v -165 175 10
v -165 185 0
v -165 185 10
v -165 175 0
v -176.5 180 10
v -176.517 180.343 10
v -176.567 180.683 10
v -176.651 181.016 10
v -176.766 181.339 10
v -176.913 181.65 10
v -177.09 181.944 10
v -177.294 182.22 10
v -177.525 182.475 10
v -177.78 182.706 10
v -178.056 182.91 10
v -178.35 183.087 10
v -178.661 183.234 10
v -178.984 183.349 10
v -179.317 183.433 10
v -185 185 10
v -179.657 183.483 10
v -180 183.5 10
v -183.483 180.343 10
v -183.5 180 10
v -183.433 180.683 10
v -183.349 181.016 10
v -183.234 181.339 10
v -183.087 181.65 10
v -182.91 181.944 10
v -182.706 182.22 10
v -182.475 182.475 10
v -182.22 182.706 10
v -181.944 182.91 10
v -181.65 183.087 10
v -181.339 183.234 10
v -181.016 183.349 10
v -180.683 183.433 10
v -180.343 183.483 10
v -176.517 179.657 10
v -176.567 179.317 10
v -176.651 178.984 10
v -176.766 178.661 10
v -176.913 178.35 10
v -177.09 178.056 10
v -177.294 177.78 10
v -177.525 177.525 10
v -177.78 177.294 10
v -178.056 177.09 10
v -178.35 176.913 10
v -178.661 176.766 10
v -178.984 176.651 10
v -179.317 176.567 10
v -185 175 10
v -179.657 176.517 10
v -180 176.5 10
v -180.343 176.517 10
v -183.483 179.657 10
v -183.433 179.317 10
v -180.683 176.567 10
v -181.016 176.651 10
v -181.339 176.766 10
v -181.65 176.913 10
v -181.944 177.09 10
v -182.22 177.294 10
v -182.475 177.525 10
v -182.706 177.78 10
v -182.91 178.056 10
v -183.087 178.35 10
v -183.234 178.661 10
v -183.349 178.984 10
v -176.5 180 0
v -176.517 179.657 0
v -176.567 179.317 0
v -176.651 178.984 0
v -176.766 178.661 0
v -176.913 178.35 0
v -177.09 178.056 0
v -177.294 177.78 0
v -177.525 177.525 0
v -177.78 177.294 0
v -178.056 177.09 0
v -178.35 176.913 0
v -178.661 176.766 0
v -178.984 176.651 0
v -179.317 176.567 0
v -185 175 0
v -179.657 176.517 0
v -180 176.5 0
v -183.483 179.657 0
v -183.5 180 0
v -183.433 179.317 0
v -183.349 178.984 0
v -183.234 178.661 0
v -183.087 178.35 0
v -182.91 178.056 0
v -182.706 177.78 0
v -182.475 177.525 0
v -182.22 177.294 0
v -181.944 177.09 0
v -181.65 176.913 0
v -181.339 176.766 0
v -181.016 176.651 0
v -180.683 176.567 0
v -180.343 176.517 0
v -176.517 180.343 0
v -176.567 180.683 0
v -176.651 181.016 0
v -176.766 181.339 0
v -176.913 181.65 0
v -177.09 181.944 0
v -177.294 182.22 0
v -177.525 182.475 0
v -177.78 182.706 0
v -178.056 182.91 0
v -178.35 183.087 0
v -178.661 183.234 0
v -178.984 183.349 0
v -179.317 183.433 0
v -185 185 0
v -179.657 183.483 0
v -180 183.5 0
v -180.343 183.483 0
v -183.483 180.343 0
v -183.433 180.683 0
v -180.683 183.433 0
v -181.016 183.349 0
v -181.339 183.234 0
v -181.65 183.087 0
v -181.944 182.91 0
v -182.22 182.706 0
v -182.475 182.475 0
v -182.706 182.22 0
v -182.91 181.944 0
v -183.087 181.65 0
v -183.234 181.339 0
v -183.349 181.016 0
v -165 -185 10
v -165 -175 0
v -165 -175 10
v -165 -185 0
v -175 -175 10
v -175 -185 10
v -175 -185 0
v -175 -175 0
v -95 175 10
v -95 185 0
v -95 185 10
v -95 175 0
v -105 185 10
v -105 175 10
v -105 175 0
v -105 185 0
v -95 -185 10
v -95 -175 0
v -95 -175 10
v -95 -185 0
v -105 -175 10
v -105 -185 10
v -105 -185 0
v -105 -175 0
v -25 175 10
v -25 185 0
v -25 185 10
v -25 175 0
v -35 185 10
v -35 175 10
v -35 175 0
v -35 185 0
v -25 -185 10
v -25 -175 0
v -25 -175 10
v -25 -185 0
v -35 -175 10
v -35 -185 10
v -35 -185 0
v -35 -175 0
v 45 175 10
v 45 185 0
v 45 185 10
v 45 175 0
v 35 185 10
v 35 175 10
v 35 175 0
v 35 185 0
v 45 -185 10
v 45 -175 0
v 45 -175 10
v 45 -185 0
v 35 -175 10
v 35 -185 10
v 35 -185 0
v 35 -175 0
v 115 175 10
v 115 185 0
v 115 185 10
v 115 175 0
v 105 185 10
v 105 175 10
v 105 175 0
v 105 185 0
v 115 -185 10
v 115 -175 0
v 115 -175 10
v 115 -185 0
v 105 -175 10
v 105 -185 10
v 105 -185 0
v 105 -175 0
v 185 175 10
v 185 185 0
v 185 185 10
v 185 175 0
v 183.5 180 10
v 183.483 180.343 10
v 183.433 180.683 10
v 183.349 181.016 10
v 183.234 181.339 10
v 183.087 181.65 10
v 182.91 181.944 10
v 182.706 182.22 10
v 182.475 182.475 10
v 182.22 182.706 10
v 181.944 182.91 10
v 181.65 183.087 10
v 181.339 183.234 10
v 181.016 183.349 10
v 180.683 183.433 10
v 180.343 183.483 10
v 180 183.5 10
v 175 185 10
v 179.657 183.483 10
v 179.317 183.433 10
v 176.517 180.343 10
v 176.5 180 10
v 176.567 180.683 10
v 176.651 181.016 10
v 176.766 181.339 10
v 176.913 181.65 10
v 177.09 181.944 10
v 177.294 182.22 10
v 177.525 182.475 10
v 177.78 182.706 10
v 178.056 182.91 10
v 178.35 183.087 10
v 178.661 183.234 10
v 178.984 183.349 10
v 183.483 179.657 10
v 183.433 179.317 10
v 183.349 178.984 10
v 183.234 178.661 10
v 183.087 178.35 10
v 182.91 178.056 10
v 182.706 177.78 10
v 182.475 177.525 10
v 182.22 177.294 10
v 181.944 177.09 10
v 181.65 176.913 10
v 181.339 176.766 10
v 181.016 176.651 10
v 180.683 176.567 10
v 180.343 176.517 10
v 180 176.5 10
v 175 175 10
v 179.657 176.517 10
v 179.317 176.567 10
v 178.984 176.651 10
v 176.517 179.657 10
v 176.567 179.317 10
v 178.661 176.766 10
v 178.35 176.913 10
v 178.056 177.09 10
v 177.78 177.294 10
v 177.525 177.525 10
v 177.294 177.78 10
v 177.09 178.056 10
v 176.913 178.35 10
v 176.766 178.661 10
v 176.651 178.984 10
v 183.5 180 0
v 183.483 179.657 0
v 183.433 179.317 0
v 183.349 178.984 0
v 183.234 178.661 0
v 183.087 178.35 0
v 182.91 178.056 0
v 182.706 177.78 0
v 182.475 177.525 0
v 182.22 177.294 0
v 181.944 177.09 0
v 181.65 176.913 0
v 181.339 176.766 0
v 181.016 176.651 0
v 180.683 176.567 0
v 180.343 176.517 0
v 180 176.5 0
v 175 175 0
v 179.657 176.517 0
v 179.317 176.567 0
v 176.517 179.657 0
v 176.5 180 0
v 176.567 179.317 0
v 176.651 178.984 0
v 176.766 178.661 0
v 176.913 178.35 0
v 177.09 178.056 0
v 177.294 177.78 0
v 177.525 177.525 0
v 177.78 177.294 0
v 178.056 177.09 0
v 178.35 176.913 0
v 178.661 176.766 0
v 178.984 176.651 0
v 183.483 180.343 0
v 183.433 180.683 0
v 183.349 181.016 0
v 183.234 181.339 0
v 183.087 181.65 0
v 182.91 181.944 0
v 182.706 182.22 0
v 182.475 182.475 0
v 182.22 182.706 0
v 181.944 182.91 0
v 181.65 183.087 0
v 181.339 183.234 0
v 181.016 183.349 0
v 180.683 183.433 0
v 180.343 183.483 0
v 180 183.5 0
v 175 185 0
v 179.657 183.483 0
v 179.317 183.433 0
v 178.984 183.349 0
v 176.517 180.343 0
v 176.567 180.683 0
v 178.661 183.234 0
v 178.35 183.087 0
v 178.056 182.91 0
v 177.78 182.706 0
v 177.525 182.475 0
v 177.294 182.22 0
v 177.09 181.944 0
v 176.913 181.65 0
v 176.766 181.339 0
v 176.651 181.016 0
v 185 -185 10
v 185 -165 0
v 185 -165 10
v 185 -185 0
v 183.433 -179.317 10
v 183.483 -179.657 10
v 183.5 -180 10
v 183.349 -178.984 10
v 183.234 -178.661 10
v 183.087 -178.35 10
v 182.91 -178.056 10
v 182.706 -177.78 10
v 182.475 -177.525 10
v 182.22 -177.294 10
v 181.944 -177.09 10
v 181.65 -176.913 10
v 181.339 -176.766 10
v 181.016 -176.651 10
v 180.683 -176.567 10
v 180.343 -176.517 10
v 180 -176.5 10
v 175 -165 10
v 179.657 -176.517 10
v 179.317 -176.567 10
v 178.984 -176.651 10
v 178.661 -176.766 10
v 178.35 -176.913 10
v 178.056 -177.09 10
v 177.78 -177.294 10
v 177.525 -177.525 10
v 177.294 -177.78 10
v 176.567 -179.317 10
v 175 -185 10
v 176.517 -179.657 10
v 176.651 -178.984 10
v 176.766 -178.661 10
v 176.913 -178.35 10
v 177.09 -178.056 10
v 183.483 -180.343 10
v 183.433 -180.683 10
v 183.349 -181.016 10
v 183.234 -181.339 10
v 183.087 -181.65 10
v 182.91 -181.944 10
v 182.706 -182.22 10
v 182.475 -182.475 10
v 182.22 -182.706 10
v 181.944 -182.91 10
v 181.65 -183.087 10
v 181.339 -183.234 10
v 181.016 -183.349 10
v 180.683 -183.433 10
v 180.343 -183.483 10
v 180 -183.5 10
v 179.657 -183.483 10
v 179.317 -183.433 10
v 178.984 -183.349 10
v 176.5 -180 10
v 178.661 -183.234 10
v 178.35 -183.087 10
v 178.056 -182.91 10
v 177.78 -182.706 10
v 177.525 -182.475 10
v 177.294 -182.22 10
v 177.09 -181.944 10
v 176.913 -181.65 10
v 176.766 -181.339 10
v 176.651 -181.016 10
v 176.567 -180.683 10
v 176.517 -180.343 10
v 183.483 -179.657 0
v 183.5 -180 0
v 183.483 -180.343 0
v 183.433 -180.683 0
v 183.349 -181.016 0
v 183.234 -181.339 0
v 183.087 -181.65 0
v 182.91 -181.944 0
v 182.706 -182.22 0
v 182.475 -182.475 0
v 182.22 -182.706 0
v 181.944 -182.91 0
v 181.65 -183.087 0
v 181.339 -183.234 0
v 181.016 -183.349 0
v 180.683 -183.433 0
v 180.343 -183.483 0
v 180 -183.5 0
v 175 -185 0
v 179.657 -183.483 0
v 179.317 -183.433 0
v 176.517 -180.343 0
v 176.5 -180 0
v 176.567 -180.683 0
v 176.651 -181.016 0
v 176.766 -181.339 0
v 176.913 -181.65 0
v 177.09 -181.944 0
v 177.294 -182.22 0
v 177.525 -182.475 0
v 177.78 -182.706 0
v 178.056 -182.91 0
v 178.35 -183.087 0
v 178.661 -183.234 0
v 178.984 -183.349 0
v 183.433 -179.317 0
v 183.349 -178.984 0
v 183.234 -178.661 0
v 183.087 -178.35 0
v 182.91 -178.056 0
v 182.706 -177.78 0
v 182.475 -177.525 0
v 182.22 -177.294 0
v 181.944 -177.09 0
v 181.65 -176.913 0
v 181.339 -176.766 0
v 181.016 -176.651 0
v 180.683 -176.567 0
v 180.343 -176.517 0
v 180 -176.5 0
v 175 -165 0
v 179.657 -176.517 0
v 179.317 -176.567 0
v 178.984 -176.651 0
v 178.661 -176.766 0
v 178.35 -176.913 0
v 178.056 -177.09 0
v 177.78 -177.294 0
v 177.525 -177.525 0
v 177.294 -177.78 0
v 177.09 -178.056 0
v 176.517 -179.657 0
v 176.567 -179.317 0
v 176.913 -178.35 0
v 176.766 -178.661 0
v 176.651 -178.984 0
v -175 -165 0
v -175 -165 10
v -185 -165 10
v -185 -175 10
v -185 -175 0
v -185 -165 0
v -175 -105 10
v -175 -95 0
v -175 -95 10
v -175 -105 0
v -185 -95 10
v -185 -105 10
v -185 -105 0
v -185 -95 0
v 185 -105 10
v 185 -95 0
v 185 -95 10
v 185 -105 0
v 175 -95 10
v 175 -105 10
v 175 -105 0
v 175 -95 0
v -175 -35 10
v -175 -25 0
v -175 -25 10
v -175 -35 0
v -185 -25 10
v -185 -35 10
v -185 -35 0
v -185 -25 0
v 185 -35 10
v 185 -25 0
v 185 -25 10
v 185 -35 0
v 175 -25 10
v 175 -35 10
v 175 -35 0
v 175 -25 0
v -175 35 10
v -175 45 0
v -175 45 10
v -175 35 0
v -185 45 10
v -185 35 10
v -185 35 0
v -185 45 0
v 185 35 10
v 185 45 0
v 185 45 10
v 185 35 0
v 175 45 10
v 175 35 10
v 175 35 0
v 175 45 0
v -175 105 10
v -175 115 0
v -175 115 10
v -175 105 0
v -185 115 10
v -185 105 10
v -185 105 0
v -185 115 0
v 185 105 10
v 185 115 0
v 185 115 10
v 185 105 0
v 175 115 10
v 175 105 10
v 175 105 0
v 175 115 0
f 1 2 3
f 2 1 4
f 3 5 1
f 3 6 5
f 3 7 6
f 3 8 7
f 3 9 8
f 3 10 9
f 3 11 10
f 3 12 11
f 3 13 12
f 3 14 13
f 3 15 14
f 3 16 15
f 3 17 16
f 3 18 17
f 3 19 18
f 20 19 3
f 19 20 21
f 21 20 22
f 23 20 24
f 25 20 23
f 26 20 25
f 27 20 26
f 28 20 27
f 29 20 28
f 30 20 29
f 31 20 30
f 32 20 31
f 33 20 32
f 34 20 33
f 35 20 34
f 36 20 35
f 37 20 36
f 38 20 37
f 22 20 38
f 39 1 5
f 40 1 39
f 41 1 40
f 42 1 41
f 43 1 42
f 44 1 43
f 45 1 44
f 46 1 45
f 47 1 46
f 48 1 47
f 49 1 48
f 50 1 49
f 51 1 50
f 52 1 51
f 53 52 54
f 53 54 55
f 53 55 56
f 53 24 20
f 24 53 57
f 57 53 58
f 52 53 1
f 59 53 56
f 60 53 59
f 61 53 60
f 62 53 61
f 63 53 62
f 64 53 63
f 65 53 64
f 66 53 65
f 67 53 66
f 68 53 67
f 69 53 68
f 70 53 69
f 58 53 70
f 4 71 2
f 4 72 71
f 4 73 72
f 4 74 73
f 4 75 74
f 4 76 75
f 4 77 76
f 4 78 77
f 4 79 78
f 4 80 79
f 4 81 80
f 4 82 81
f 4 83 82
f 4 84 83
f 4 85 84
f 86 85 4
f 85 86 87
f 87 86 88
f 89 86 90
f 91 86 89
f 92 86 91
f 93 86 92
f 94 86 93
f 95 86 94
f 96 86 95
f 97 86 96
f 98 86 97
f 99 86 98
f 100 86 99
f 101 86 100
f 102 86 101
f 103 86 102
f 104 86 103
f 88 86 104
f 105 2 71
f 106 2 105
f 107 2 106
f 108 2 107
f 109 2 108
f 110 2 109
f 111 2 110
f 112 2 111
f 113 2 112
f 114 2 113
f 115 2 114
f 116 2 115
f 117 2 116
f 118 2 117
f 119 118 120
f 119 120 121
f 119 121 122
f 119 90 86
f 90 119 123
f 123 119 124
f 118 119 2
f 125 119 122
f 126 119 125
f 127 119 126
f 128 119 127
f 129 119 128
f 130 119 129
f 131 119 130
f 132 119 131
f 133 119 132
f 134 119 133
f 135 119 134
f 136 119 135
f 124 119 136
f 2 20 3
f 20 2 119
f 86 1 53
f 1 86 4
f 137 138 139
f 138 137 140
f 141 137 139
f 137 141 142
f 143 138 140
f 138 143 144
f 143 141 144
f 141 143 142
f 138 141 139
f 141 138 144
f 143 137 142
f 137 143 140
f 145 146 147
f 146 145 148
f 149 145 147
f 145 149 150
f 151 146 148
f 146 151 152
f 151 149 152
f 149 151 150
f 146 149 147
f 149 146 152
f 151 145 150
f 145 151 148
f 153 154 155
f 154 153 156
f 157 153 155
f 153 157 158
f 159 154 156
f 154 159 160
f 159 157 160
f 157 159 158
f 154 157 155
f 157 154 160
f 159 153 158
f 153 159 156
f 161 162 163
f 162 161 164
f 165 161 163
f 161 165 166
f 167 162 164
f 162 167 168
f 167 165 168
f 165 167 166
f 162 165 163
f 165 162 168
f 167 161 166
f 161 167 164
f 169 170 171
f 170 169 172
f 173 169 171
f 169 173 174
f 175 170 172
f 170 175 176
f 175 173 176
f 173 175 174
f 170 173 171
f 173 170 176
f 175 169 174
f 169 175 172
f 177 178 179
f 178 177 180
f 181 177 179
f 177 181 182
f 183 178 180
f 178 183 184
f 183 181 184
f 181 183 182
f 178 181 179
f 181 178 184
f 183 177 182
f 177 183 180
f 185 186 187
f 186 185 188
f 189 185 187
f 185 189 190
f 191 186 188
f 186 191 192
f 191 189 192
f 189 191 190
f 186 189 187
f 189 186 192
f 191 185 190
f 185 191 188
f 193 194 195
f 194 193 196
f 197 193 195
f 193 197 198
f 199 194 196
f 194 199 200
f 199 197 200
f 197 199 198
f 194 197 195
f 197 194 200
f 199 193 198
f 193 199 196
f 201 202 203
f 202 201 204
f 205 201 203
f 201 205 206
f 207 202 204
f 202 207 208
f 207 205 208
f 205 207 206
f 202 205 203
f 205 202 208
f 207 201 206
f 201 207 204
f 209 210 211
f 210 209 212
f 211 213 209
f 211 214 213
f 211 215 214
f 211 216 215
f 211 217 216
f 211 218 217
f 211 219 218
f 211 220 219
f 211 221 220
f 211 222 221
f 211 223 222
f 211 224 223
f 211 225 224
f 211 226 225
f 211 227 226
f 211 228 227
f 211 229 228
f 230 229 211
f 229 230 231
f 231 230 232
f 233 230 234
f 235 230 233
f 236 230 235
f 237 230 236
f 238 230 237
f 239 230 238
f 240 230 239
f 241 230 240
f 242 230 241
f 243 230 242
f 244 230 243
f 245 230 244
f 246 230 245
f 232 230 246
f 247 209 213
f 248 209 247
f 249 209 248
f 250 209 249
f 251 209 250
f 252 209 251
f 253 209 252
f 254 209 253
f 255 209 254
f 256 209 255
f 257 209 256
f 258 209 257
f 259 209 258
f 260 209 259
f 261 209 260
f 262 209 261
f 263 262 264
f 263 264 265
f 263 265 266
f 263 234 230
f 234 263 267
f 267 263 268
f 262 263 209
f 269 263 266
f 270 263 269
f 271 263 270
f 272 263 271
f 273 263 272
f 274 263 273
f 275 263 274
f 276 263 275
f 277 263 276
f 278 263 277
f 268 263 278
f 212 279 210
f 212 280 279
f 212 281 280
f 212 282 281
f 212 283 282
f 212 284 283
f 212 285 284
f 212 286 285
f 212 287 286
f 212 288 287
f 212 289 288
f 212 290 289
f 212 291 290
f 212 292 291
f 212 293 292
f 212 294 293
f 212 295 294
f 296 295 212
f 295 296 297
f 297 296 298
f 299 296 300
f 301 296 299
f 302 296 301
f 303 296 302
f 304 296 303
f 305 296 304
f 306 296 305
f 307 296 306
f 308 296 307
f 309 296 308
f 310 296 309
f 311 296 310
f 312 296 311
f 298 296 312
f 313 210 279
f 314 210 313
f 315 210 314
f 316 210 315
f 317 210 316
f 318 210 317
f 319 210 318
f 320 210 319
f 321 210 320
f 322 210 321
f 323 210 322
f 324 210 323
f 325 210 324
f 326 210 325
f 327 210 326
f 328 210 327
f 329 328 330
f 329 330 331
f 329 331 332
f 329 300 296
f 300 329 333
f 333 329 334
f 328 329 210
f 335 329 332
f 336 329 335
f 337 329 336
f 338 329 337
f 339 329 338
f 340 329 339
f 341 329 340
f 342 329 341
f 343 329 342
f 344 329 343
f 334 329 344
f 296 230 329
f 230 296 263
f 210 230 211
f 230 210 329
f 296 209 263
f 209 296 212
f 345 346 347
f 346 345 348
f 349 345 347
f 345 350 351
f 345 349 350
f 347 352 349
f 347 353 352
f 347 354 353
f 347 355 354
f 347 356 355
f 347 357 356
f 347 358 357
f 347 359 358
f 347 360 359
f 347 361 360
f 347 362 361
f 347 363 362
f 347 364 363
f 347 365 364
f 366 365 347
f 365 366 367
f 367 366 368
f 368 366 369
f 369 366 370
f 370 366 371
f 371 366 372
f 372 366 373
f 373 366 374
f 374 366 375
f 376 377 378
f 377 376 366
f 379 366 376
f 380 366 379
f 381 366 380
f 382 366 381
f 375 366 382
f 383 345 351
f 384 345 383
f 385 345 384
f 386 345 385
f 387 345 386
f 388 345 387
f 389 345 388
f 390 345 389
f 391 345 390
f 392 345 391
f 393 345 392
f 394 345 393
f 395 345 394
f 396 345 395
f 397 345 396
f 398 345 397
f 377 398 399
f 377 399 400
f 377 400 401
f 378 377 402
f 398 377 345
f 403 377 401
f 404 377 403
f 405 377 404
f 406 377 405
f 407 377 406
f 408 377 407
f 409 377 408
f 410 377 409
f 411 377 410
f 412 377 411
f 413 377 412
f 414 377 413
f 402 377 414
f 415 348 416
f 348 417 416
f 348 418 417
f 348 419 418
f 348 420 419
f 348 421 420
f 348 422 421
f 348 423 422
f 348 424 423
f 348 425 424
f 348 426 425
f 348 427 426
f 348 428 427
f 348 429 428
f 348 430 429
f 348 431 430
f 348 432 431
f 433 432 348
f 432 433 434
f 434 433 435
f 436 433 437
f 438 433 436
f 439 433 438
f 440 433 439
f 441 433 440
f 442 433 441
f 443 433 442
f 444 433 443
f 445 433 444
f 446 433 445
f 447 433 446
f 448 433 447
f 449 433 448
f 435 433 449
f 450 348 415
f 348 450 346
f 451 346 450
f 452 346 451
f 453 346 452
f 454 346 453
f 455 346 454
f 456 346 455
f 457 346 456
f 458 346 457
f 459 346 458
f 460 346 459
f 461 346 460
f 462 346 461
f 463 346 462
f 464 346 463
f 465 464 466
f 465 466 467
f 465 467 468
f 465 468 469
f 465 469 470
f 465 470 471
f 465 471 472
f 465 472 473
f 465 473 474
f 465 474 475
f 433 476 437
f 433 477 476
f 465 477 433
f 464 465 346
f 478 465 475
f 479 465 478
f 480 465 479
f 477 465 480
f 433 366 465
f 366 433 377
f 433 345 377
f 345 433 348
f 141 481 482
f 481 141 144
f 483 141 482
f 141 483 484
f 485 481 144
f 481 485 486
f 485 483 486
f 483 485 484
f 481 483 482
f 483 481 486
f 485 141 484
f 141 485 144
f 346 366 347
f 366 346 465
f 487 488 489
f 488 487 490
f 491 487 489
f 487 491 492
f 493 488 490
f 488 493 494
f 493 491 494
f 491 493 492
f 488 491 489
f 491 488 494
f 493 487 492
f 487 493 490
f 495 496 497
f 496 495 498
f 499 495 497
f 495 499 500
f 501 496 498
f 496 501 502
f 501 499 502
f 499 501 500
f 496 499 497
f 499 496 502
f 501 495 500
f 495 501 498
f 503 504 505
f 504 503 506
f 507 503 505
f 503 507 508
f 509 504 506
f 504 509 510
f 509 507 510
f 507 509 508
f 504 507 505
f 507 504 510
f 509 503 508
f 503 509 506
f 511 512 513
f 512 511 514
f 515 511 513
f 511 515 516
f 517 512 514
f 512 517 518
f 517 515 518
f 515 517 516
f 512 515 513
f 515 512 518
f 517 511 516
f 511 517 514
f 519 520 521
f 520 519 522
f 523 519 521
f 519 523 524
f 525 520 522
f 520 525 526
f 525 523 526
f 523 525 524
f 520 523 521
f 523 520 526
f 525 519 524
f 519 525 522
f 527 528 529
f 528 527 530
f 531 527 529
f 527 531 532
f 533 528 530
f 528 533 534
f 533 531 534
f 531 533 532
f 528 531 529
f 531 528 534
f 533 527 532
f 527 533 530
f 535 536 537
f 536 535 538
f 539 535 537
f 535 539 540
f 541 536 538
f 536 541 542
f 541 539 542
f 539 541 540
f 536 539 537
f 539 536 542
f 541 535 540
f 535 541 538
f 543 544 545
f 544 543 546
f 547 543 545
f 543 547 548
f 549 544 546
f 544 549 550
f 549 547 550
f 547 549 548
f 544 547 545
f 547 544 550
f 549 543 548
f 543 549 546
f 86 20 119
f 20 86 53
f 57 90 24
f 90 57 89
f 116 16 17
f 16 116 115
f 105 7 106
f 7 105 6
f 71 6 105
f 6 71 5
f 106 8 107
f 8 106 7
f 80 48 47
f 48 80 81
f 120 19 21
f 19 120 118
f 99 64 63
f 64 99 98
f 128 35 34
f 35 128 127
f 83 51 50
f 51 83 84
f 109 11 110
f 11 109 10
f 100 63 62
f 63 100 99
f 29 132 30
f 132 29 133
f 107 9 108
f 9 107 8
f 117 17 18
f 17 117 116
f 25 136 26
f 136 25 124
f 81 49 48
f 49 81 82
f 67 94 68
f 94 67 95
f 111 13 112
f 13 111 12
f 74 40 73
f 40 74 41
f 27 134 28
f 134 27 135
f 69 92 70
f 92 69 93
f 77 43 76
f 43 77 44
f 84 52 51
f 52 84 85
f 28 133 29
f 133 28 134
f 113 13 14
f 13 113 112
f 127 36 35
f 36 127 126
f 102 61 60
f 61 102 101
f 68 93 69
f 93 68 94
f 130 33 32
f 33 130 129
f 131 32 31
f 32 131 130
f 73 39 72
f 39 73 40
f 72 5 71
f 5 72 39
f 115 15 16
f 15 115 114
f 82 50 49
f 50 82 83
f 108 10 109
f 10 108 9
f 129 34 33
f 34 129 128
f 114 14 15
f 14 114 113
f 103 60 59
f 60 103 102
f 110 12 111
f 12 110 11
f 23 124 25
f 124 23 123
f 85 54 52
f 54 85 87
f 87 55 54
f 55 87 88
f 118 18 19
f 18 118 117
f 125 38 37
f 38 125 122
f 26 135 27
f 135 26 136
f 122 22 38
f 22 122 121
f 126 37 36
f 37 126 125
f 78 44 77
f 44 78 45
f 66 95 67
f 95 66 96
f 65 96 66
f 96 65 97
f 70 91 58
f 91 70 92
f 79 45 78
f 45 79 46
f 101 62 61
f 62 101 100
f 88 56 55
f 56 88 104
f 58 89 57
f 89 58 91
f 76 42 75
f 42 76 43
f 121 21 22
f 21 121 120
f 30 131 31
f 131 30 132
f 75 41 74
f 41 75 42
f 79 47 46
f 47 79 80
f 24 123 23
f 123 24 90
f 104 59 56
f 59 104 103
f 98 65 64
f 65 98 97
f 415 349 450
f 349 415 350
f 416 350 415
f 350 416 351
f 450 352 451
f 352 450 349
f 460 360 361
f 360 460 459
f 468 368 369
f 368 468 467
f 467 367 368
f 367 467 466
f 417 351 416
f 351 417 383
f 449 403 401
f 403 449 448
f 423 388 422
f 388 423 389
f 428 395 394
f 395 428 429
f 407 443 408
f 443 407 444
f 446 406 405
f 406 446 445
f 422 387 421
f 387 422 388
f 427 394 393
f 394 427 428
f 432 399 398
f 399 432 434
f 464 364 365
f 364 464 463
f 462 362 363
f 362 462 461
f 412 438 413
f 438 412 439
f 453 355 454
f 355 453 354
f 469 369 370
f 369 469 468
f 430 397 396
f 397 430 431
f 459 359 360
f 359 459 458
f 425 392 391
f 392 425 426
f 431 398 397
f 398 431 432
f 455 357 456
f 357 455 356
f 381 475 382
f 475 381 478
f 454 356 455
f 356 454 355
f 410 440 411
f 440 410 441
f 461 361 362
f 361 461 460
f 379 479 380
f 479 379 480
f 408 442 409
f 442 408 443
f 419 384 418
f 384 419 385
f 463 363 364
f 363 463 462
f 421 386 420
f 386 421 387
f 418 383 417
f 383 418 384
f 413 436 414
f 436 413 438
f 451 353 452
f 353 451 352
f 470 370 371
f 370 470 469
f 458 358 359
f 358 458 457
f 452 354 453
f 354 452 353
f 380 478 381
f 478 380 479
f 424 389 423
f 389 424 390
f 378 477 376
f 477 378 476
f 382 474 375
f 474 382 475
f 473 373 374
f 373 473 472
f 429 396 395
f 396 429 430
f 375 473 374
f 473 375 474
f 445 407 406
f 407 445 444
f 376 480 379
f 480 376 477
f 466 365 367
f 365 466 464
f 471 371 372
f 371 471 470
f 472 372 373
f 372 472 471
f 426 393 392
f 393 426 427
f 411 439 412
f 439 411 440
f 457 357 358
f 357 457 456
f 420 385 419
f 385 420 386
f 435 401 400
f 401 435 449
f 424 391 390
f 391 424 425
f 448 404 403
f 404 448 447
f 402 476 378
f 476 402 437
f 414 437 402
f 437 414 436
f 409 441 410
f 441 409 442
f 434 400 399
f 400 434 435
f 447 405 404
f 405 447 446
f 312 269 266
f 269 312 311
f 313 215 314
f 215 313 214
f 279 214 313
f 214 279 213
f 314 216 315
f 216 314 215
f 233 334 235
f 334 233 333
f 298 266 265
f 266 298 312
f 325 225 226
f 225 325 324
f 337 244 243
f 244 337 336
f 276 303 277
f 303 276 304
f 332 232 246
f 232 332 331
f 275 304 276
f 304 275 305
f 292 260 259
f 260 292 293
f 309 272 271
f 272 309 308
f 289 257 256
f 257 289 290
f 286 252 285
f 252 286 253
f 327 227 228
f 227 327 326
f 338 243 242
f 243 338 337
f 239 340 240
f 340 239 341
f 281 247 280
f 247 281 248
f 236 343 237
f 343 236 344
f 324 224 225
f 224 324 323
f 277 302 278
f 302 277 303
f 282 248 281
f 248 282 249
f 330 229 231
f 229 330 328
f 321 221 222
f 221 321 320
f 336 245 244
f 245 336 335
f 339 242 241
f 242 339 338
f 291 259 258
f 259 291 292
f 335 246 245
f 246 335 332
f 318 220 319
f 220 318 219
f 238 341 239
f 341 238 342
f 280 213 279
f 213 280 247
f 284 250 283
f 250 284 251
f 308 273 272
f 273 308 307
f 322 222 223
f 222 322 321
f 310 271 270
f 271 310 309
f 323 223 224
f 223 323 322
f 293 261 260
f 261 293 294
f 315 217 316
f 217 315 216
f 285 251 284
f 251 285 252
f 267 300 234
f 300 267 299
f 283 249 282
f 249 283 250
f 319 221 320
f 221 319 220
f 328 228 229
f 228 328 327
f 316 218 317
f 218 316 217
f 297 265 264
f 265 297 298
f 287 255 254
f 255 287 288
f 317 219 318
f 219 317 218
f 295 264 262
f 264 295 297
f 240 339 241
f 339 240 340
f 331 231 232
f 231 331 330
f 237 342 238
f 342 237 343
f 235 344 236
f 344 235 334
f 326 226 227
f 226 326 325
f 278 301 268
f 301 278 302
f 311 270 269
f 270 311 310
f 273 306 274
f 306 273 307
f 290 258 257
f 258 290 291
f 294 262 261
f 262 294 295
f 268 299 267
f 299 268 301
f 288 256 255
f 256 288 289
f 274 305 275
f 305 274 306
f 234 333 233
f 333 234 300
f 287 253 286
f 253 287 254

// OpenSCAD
// ring_23.scad - ring index 23 (z bottom = 230 mm)
$fn = 64; bar = 10; half_b = bar/2; outer = 370; half_outer = outer/2;
front_y = 180; back_y = -180; left_x = -180; right_x = 180;
x_centers = [-170, -100, -30, 40, 110, 180];
z_centers = [5, 85, 155, 225, 295, 365, 435, 505, 575, 645, 715]; ring_z = 230;
module place_box(cx, cy, sx, sy) { translate([cx - sx/2, cy - sy/2, 0]) cube([sx, sy, bar]); }

difference() { union() {
    for (x = x_centers) { place_box(x, front_y, bar, bar); place_box(x, back_y, bar, bar); }
    for (y = x_centers) { place_box(left_x, y, bar, bar); place_box(right_x, y, bar, bar); }
    for (zc = z_centers) if ((zc - half_b < ring_z + bar) && (zc + half_b > ring_z)) {
        translate([-half_outer, front_y - half_b, 0]) cube([outer, bar, bar]);
        translate([-half_outer, back_y - half_b, 0])  cube([outer, bar, bar]);
        translate([left_x - half_b, -half_outer, 0])  cube([bar, outer, bar]);
        translate([right_x - half_b, -half_outer, 0]) cube([bar, outer, bar]);
    }
  }
  for (cx = [-180, 180]) for (cy = [-180, 180]) translate([cx, cy, 0]) cylinder(h = bar, r = 3.5, $fn = 64);
}
